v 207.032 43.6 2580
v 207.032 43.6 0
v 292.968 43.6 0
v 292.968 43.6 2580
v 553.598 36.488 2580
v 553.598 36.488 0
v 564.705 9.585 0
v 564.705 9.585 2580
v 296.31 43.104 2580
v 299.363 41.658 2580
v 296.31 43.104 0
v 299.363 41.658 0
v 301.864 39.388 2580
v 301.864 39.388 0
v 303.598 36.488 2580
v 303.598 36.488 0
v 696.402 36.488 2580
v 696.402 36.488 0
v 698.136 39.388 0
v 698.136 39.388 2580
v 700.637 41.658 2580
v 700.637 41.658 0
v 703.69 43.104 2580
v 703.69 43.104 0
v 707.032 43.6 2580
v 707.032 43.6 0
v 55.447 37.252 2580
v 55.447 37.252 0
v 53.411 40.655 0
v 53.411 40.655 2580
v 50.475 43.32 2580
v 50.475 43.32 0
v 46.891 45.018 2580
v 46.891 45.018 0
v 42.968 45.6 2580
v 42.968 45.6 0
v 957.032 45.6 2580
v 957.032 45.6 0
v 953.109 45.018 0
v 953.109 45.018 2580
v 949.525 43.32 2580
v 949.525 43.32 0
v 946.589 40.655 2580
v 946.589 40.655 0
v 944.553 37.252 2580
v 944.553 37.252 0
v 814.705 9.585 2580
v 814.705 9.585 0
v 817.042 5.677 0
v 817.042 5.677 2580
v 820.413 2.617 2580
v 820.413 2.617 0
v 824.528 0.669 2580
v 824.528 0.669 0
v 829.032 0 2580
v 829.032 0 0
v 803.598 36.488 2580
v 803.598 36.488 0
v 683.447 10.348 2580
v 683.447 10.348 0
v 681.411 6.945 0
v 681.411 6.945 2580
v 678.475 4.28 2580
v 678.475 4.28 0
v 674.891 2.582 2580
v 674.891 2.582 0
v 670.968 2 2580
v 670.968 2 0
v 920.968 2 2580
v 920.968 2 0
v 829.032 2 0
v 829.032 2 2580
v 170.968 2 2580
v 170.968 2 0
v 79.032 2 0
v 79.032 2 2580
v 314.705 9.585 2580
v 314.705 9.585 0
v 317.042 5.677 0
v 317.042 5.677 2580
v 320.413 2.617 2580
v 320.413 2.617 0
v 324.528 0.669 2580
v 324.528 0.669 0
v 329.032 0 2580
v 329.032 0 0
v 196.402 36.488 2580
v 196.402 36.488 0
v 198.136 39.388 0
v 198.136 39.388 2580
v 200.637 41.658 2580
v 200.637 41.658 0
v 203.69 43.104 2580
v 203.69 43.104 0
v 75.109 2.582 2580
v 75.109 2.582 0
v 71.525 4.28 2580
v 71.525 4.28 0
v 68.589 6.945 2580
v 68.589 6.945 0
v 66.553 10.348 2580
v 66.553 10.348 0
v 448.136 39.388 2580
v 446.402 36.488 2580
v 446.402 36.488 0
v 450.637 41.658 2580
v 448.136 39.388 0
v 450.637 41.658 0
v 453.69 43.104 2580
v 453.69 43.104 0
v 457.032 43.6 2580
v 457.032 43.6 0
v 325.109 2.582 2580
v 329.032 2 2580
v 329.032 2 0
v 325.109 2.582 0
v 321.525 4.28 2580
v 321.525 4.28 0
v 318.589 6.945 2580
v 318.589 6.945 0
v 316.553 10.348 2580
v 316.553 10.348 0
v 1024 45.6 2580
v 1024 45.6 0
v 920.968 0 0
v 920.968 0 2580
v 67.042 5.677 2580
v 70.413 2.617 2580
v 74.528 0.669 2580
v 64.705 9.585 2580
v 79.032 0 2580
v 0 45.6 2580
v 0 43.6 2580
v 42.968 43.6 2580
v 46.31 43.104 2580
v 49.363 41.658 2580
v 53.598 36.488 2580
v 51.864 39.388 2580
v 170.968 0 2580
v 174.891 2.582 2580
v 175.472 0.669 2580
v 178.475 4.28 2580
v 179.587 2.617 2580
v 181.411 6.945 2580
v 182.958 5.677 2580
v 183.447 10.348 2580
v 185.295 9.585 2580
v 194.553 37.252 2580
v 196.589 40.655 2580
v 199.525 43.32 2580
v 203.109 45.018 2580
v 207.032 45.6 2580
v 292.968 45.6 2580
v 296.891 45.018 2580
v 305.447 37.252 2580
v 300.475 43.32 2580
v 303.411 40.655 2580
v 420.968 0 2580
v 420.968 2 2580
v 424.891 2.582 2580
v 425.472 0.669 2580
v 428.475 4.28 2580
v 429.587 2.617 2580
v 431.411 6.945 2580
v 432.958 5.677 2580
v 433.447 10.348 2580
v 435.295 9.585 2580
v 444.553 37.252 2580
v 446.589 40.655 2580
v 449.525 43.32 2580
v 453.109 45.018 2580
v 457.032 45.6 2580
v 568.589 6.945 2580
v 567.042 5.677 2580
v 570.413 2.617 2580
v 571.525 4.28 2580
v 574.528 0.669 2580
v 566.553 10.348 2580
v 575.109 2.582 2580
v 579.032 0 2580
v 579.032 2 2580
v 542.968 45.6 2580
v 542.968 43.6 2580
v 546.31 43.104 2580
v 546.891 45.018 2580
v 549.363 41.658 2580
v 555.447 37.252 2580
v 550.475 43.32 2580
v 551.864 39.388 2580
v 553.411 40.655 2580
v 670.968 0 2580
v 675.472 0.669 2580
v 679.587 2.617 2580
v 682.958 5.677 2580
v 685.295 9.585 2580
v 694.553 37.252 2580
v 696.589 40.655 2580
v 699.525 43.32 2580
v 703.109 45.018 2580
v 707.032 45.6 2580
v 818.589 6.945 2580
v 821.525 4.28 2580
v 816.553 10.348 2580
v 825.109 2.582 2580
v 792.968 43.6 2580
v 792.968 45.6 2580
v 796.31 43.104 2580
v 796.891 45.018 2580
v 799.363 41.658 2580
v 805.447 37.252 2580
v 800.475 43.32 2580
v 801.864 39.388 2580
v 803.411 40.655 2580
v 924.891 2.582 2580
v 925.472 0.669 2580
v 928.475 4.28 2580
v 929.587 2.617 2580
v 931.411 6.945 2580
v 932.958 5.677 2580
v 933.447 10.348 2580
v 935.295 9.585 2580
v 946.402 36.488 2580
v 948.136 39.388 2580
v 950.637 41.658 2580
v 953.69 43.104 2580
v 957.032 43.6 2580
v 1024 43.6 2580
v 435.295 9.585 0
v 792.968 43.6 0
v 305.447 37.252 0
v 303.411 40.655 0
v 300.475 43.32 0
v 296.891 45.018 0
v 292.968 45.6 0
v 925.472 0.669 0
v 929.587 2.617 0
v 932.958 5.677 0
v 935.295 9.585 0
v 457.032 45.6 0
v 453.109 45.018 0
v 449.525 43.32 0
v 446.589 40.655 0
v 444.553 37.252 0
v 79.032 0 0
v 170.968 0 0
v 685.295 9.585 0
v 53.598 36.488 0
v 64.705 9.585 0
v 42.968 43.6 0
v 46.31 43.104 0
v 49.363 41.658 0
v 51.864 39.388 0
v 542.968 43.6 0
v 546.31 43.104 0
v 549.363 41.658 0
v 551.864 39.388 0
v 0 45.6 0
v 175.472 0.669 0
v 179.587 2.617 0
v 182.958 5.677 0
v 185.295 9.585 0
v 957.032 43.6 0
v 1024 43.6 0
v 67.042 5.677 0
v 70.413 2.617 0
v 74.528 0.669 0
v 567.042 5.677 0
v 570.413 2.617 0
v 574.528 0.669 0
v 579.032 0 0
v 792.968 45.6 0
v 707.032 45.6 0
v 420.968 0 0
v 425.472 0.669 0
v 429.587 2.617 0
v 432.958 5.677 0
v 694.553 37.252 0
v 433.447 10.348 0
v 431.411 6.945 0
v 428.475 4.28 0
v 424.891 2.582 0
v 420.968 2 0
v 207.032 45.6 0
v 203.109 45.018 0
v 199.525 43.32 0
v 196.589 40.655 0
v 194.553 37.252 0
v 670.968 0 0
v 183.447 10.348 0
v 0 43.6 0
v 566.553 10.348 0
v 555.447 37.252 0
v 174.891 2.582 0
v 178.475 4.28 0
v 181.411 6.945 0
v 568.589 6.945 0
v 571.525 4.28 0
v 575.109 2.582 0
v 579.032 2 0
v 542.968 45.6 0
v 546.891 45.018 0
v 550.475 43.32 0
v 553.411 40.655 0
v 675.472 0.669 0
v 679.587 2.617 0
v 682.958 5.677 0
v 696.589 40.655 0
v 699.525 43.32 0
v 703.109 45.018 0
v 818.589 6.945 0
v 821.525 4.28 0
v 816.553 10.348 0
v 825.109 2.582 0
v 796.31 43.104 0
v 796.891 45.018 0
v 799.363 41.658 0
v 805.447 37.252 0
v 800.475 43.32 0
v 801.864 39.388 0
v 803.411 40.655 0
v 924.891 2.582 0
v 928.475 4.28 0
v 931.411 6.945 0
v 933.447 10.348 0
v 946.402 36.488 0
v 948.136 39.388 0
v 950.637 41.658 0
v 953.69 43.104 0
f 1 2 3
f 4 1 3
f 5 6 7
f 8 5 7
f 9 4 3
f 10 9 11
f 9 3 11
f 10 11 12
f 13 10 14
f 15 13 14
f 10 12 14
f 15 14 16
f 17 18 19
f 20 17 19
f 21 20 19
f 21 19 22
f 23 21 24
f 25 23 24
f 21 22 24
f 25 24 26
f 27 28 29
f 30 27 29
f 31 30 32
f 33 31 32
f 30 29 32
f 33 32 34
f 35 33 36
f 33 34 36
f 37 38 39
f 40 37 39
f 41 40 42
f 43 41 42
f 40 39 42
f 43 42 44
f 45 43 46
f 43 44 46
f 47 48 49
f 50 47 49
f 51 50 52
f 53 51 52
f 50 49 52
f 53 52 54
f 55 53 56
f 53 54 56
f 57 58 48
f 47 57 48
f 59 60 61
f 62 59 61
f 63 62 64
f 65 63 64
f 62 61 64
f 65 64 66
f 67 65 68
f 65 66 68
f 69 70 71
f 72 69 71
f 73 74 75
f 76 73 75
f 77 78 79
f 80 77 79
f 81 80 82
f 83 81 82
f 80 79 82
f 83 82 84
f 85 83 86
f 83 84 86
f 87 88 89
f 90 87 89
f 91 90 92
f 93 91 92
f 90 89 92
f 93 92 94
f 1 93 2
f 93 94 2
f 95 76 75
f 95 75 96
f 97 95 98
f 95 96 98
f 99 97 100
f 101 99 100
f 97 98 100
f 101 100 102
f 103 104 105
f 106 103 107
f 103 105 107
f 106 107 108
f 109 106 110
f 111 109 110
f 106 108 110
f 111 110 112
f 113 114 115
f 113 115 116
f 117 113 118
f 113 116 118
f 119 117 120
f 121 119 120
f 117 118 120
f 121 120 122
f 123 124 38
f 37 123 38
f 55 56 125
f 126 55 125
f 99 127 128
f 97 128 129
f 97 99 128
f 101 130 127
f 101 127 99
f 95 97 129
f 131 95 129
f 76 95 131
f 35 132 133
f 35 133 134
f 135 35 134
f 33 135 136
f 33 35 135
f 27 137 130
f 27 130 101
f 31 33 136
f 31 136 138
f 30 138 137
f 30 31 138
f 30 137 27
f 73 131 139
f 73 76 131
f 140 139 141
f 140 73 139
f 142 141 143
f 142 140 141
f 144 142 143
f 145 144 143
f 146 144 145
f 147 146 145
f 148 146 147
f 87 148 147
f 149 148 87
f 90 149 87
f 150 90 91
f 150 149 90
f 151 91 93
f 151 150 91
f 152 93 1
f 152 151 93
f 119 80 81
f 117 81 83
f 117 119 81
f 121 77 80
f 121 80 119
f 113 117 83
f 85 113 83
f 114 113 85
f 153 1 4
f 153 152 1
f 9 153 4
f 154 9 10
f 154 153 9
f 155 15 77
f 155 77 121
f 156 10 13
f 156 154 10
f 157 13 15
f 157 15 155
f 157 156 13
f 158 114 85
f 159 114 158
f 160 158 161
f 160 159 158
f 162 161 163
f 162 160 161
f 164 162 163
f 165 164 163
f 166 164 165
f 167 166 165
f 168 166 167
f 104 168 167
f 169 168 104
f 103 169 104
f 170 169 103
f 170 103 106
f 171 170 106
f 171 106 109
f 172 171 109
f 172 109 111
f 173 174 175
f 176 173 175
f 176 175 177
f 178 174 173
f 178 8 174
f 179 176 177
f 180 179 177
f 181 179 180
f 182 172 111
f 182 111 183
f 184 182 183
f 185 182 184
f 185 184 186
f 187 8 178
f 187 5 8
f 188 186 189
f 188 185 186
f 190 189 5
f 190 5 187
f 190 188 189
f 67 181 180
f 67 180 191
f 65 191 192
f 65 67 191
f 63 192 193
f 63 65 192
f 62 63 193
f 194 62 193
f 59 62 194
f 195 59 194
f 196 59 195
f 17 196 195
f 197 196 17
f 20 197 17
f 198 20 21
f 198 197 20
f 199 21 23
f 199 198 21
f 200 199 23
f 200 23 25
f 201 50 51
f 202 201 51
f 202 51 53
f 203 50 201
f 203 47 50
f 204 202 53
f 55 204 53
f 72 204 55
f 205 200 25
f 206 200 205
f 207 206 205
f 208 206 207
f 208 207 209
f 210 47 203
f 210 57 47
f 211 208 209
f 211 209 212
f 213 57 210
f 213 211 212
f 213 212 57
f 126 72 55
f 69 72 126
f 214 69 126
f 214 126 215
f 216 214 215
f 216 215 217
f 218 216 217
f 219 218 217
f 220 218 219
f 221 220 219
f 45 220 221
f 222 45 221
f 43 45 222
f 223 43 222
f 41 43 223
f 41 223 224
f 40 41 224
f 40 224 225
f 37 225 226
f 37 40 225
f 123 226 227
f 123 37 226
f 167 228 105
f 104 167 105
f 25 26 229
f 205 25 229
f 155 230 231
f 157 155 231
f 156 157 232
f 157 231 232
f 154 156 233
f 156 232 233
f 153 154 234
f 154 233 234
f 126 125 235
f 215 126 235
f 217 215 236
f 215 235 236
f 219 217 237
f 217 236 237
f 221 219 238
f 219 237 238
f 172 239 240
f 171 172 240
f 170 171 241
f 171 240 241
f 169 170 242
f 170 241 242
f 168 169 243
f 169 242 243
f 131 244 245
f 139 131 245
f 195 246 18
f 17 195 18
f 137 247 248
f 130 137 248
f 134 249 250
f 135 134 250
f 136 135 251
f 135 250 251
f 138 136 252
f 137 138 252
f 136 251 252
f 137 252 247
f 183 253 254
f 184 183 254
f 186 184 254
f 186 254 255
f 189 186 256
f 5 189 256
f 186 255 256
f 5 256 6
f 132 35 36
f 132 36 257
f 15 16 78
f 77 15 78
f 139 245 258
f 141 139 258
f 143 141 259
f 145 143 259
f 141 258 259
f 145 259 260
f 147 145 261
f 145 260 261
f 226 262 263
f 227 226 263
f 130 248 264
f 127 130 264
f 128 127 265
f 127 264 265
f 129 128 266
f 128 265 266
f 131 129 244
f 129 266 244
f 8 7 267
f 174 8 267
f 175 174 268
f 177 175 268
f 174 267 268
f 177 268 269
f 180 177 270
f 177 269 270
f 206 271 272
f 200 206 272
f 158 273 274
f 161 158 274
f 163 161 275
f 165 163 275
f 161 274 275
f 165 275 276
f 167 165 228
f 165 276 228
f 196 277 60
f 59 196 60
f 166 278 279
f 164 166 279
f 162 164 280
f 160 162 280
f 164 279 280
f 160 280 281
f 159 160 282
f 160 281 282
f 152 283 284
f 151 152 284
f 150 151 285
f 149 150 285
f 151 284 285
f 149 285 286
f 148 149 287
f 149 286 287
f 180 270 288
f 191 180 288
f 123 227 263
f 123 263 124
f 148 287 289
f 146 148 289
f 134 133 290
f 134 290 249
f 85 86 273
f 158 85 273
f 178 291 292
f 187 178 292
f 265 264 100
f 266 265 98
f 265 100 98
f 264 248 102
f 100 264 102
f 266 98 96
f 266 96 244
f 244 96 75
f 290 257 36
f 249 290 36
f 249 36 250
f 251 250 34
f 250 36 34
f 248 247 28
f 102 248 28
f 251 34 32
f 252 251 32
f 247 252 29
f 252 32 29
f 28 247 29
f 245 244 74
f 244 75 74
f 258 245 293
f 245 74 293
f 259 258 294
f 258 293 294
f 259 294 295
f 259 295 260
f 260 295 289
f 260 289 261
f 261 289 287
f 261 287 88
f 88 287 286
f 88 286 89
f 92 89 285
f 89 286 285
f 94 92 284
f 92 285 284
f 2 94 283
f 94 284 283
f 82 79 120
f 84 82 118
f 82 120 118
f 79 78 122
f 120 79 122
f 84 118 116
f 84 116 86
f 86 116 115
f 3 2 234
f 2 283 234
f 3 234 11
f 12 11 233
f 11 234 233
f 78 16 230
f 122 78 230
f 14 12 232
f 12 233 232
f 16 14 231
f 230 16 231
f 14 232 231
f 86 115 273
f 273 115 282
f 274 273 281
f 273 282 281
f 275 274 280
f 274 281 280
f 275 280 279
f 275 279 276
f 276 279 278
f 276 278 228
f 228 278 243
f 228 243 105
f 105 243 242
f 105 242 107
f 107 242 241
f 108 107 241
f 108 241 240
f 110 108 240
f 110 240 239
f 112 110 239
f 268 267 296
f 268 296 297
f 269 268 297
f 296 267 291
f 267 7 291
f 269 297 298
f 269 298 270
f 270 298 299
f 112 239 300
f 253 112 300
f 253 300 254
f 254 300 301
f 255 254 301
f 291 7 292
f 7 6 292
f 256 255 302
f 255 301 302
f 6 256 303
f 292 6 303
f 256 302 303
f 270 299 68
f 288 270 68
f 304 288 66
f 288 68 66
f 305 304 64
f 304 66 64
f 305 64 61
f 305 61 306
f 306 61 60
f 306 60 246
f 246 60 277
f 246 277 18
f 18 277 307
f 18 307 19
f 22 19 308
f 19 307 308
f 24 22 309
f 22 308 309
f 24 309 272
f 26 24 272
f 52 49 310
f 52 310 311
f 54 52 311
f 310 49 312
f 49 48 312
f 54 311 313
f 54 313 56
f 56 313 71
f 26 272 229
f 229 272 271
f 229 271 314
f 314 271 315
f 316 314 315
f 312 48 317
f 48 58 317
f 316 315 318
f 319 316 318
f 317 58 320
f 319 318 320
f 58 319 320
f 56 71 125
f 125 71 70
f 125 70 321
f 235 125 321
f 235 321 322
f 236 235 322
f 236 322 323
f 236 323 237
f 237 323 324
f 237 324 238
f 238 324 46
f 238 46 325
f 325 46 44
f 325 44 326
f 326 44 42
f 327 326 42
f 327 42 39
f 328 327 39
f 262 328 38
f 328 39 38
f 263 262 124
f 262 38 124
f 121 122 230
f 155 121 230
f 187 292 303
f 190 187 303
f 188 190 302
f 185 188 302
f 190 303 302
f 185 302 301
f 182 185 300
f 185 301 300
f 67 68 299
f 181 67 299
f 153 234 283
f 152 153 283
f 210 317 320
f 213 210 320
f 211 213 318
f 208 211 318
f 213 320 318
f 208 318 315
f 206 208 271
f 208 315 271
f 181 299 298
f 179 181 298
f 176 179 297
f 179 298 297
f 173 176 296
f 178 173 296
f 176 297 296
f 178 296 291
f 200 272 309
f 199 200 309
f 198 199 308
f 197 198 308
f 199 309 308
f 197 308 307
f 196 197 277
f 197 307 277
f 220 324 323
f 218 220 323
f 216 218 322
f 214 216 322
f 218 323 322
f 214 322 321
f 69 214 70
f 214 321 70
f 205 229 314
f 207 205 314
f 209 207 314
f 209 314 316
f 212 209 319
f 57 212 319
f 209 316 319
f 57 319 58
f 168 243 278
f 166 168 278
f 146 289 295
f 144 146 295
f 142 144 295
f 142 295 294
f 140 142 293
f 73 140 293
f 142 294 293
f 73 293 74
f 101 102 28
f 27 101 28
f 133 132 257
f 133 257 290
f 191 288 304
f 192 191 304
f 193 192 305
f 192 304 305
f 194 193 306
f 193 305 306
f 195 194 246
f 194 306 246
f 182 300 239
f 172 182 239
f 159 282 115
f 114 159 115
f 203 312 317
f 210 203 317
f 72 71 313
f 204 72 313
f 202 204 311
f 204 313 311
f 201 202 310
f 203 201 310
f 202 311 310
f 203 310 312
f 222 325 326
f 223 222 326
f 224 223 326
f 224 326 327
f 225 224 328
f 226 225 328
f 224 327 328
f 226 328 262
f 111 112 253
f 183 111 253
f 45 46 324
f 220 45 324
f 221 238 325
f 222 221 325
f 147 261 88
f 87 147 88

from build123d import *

# Parameters (mm, degrees)
F1_DEPTH = 2580


with BuildPart() as f1:
    # F0 (on Top) → F1 (new body)
    with BuildSketch(Plane.XY):
        with BuildLine():
            Line((42.968165, 45.6), (0, 45.6))
            Line((0, 45.6), (0, 43.6))
            Line((0, 43.6), (42.968165, 43.6))
            ThreePointArc((42.968165, 43.6), (49.362813, 41.658163), (53.597919, 36.488431))
            Line((53.597919, 36.488431), (64.704775, 9.585159))
            ThreePointArc((64.704775, 9.585159), (70.412961, 2.617259), (79.031835, 0))
            Line((79.031835, 0), (170.968165, 0))
            ThreePointArc((170.968165, 0), (179.587039, 2.617259), (185.295225, 9.585159))
            Line((185.295225, 9.585159), (196.402081, 36.488431))
            ThreePointArc((196.402081, 36.488431), (200.637187, 41.658163), (207.031835, 43.6))
            Line((207.031835, 43.6), (292.968165, 43.6))
            ThreePointArc((292.968165, 43.6), (299.362813, 41.658163), (303.597919, 36.488431))
            Line((303.597919, 36.488431), (314.704775, 9.585159))
            ThreePointArc((314.704775, 9.585159), (320.412961, 2.617259), (329.031835, 0))
            Line((329.031835, 0), (420.968165, 0))
            ThreePointArc((420.968165, 0), (429.587039, 2.617259), (435.295225, 9.585159))
            Line((435.295225, 9.585159), (446.402081, 36.488431))
            ThreePointArc((446.402081, 36.488431), (450.637187, 41.658163), (457.031835, 43.6))
            Line((457.031835, 43.6), (542.968165, 43.6))
            ThreePointArc((542.968165, 43.6), (549.362813, 41.658163), (553.597919, 36.488431))
            Line((553.597919, 36.488431), (564.704775, 9.585159))
            ThreePointArc((564.704775, 9.585159), (570.412961, 2.617259), (579.031835, 0))
            Line((579.031835, 0), (670.968165, 0))
            ThreePointArc((670.968165, 0), (679.587039, 2.617259), (685.295225, 9.585159))
            Line((685.295225, 9.585159), (696.402081, 36.488431))
            ThreePointArc((696.402081, 36.488431), (700.637187, 41.658163), (707.031835, 43.6))
            Line((707.031835, 43.6), (792.968165, 43.6))
            ThreePointArc((792.968165, 43.6), (799.362813, 41.658163), (803.597919, 36.488431))
            Line((803.597919, 36.488431), (814.704775, 9.585159))
            ThreePointArc((814.704775, 9.585159), (820.412961, 2.617259), (829.031835, 0))
            Line((829.031835, 0), (920.968165, 0))
            ThreePointArc((920.968165, 0), (929.587039, 2.617259), (935.295225, 9.585159))
            Line((935.295225, 9.585159), (946.402081, 36.488431))
            ThreePointArc((946.402081, 36.488431), (950.637187, 41.658163), (957.031835, 43.6))
            Line((957.031835, 43.6), (1024, 43.6))
            Line((1024, 43.6), (1024, 45.6))
            Line((1024, 45.6), (957.031835, 45.6))
            ThreePointArc((957.031835, 45.6), (949.525074, 43.320452), (944.553428, 37.251636))
            Line((944.553428, 37.251636), (933.446572, 10.348364))
            ThreePointArc((933.446572, 10.348364), (928.474926, 4.279548), (920.968165, 2))
            Line((920.968165, 2), (829.031835, 2))
            ThreePointArc((829.031835, 2), (821.525074, 4.279548), (816.553428, 10.348364))
            Line((816.553428, 10.348364), (805.446572, 37.251636))
            ThreePointArc((805.446572, 37.251636), (800.474926, 43.320452), (792.968165, 45.6))
            Line((792.968165, 45.6), (707.031835, 45.6))
            ThreePointArc((707.031835, 45.6), (699.525074, 43.320452), (694.553428, 37.251636))
            Line((694.553428, 37.251636), (683.446572, 10.348364))
            ThreePointArc((683.446572, 10.348364), (678.474926, 4.279548), (670.968165, 2))
            Line((670.968165, 2), (579.031835, 2))
            ThreePointArc((579.031835, 2), (571.525074, 4.279548), (566.553428, 10.348364))
            Line((566.553428, 10.348364), (555.446572, 37.251636))
            ThreePointArc((555.446572, 37.251636), (550.474926, 43.320452), (542.968165, 45.6))
            Line((542.968165, 45.6), (457.031835, 45.6))
            ThreePointArc((457.031835, 45.6), (449.525074, 43.320452), (444.553428, 37.251636))
            Line((444.553428, 37.251636), (433.446572, 10.348364))
            ThreePointArc((433.446572, 10.348364), (428.474926, 4.279548), (420.968165, 2))
            Line((420.968165, 2), (329.031835, 2))
            ThreePointArc((329.031835, 2), (321.525074, 4.279548), (316.553428, 10.348364))
            Line((316.553428, 10.348364), (305.446572, 37.251636))
            ThreePointArc((305.446572, 37.251636), (300.474926, 43.320452), (292.968165, 45.6))
            Line((292.968165, 45.6), (207.031835, 45.6))
            ThreePointArc((207.031835, 45.6), (199.525074, 43.320452), (194.553428, 37.251636))
            Line((194.553428, 37.251636), (183.446572, 10.348364))
            ThreePointArc((183.446572, 10.348364), (178.474926, 4.279548), (170.968165, 2))
            Line((170.968165, 2), (79.031835, 2))
            ThreePointArc((79.031835, 2), (71.525074, 4.279548), (66.553428, 10.348364))
            Line((66.553428, 10.348364), (55.446572, 37.251636))
            ThreePointArc((55.446572, 37.251636), (50.474926, 43.320452), (42.968165, 45.6))
        make_face()
    extrude(amount=F1_DEPTH)


solid = f1.part
